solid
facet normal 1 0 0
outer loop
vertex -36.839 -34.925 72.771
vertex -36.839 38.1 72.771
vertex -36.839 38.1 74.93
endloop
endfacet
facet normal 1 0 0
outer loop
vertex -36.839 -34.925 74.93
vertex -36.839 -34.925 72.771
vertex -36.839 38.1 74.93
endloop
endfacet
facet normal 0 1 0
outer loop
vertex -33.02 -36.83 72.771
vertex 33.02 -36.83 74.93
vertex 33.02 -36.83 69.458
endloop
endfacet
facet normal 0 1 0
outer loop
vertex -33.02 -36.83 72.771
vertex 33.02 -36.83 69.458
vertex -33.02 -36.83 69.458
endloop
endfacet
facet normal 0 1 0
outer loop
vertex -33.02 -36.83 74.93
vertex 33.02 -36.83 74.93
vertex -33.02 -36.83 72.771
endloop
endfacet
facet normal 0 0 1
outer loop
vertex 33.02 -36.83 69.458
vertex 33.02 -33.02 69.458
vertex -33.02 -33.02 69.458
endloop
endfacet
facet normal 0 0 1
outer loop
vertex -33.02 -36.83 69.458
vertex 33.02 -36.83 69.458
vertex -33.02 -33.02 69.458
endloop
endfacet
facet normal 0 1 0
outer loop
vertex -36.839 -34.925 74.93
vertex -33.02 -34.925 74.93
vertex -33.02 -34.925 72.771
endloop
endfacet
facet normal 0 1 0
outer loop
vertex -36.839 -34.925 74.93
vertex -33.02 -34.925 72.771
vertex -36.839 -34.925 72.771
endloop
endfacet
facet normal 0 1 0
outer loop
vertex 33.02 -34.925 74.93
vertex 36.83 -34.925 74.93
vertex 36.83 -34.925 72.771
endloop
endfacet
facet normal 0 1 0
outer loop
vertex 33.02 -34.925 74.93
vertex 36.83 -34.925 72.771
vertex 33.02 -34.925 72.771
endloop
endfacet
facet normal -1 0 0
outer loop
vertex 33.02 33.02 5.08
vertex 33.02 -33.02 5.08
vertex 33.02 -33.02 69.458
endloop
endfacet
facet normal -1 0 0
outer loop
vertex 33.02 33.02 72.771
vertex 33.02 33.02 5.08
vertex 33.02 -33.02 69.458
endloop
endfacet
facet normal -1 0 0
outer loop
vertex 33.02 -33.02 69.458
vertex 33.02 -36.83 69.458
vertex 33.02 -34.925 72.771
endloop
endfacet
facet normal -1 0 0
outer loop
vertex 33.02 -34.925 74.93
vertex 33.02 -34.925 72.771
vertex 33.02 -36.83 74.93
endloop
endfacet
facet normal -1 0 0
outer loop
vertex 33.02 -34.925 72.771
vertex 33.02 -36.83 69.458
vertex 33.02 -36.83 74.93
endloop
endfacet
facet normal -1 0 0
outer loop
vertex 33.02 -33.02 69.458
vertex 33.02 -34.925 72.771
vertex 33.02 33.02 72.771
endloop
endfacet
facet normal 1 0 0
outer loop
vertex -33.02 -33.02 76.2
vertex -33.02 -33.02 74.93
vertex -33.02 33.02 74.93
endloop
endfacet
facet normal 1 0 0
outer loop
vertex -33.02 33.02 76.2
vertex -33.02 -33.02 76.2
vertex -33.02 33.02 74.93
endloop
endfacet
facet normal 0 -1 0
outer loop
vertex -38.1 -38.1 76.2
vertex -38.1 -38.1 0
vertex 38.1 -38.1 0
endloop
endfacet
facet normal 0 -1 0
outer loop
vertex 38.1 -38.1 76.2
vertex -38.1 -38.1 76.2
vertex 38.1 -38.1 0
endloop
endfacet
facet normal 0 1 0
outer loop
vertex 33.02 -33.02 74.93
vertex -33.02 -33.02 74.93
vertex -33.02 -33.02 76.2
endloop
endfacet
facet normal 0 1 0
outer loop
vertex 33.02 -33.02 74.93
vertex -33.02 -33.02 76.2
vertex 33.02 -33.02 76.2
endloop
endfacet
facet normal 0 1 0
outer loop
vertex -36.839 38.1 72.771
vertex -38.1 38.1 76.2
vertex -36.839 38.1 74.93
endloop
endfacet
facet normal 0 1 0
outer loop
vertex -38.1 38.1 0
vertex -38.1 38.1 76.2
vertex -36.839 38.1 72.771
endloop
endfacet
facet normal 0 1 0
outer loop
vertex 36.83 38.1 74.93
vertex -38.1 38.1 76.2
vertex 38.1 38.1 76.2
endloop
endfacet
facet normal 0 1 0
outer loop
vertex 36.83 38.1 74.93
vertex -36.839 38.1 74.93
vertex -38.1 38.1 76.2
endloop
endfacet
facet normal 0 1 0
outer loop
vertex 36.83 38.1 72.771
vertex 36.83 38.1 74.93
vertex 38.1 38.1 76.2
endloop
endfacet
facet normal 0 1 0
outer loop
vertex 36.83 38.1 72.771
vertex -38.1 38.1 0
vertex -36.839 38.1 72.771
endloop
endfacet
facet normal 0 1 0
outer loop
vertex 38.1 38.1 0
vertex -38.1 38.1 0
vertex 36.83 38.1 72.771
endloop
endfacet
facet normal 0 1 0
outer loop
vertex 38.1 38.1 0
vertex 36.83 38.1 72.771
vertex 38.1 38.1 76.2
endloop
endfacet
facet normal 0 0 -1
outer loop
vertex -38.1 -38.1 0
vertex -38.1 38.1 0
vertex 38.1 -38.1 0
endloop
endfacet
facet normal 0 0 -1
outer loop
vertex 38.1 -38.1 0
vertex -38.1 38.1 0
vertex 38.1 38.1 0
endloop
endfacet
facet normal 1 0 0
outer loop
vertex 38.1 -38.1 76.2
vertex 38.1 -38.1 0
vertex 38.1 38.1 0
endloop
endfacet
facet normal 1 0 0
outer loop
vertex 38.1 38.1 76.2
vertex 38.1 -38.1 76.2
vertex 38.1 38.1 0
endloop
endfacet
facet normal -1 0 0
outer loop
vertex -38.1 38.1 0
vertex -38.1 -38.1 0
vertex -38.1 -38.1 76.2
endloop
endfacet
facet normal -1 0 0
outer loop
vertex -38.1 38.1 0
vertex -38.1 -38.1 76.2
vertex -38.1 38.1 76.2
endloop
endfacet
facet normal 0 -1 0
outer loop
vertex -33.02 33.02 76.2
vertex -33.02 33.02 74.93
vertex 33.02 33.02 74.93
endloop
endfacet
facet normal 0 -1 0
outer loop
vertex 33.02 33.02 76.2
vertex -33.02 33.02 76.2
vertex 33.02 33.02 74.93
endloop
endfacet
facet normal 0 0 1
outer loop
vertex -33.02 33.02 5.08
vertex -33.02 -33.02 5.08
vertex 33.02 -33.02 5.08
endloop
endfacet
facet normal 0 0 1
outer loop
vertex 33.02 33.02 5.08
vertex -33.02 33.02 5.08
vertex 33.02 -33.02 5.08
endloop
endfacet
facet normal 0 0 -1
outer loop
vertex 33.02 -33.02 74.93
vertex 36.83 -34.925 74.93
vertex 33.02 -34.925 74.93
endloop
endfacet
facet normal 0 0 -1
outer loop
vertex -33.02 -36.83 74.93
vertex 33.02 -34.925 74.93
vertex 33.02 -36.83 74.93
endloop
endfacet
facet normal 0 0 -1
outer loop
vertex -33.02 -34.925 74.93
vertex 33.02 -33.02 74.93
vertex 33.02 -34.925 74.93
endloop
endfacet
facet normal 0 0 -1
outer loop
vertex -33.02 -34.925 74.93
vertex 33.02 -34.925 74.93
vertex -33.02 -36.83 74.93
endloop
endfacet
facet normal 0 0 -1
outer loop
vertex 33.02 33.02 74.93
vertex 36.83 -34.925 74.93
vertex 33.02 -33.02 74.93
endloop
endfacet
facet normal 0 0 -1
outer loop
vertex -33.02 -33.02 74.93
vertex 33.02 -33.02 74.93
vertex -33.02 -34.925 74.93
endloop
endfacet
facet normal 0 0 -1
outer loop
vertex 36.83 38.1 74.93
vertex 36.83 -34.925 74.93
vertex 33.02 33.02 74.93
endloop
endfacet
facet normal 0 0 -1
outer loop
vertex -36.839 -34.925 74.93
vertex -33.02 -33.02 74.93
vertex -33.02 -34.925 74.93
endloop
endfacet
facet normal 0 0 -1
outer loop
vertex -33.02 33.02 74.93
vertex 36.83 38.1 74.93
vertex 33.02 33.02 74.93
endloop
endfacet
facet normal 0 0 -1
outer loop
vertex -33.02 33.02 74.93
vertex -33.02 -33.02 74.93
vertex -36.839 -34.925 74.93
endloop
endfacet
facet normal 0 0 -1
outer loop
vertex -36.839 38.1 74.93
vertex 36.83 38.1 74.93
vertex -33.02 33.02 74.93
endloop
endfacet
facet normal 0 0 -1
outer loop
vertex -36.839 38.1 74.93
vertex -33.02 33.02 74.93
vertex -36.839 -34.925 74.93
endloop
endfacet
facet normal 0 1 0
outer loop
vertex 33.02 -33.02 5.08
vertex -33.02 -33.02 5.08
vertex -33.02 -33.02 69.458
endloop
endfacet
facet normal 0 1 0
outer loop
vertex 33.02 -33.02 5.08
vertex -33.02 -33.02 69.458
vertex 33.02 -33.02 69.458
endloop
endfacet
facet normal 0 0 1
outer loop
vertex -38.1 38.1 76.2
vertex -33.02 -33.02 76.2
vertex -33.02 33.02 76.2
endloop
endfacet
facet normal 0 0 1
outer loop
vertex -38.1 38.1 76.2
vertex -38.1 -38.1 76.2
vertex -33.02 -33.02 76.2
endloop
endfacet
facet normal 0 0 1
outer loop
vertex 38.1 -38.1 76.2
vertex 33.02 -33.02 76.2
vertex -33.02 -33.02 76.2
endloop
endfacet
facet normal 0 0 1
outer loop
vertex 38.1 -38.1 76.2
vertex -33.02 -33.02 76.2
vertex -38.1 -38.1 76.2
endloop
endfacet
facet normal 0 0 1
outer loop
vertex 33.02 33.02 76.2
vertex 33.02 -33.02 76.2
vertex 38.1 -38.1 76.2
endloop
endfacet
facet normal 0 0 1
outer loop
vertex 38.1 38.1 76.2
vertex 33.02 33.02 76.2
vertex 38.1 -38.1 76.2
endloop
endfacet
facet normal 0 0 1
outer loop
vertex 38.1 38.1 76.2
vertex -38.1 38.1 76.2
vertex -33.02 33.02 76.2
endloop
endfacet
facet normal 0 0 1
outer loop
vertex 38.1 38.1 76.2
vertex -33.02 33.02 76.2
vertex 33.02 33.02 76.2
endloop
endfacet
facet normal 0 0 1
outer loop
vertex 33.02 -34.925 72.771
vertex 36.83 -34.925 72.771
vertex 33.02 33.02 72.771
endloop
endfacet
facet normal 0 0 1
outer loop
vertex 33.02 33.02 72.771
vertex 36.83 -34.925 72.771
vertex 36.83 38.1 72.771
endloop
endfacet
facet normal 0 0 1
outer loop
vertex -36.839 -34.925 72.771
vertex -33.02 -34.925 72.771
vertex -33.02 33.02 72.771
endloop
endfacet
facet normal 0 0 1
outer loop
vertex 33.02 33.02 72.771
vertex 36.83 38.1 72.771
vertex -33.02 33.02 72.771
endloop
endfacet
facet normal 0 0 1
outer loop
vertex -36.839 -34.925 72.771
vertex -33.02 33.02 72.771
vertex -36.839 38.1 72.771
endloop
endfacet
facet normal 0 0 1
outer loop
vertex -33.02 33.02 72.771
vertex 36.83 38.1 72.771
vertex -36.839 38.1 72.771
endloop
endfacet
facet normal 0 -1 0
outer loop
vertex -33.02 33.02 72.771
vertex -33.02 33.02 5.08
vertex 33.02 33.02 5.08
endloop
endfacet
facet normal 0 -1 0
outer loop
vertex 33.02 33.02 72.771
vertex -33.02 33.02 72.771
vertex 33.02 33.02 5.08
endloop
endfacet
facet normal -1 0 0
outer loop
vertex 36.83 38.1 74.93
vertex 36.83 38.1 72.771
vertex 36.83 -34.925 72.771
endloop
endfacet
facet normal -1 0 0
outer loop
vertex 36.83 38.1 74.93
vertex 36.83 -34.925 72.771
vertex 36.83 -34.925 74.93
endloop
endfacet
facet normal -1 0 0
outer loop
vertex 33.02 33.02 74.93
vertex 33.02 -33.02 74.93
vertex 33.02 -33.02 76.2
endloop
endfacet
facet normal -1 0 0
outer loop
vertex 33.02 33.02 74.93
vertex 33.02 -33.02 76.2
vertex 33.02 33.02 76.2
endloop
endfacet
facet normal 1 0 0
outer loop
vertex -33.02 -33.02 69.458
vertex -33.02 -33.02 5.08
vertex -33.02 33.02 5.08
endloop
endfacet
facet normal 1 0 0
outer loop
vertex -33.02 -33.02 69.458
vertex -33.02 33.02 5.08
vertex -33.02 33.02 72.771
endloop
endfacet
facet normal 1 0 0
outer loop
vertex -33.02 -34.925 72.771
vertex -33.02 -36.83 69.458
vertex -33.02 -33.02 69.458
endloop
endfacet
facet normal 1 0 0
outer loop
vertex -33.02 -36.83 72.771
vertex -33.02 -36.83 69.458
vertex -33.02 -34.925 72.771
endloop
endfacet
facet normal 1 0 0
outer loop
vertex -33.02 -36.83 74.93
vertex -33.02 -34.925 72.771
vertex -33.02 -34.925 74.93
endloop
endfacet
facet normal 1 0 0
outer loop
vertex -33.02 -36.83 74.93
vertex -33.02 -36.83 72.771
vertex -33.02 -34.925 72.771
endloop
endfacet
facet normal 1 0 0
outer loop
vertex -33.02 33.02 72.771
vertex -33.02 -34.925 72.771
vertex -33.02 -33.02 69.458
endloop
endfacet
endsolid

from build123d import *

# Parameters (mm, degrees)
F0_W     = 76.2
F0_H     = 76.2
F1_DEPTH = 76.2
F2_T     = -5.08
F3_W     = 73.6691647935
F3_H     = 2.159
F4_DEPTH = 74.93
F5_W     = 66.04
F5_H     = 5.4402127862
F6_DEPTH = 3.81
F7_W     = 3.81
F7_H     = 2.159
F7_W_2   = 3.8191647935
F8_DEPTH = 1.905


with BuildPart() as f1:
    # F0 (on Top) → F1 (new body)
    with BuildSketch(Plane.XY):
        Rectangle(F0_W, F0_H)
    extrude(amount=F1_DEPTH)

    # F2
    f2_openings = [f1.faces().sort_by_distance(p)[0] for p in [
        (0, 0, 76.2),
    ]]
    offset(amount=F2_T, openings=f2_openings)

    # F3 (on face) → F4 (cut)
    with BuildSketch(Plane(origin=(0, 38.1, 0), x_dir=(-1, 0, 0), z_dir=(0, 1, 0))):
        with Locations((0.0045823967, 73.8505)):
            Rectangle(F3_W, F3_H)
    extrude(amount=-F4_DEPTH, mode=Mode.SUBTRACT)

    # F5 (on face) → F6 (cut)
    with BuildSketch(Plane(origin=(0, -33.02, 0), x_dir=(-1, 0, 0), z_dir=(0, 1, 0))):
        with Locations((0, 72.1777938306)):
            Rectangle(F5_W, F5_H)
    extrude(amount=-F6_DEPTH, mode=Mode.SUBTRACT)

    # F7 (on face) → F8 (join)
    with BuildSketch(Plane(origin=(0, -36.83, 0), x_dir=(-1, 0, 0), z_dir=(0, 1, 0))):
        with Locations((-34.925, 73.8505)):
            Rectangle(F7_W, F7_H)
        with Locations((34.9295823967, 73.8505)):
            Rectangle(F7_W_2, F7_H)
    extrude(amount=F8_DEPTH)


solid = f1.part
